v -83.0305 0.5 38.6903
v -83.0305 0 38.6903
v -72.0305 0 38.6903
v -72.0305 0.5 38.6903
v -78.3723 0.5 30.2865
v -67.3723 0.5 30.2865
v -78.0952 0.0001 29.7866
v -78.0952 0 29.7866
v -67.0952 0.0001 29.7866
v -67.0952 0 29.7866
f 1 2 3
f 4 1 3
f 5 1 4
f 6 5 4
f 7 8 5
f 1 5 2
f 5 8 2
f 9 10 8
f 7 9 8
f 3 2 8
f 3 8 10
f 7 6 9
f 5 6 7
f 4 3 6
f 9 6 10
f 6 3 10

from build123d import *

# Parameters (mm, degrees)
BOSS_EXTRUDE1_DEPTH = 0.5
CHAMFER1_SIZE       = 0.5


with BuildPart() as part:
    # Sketch1 → Boss-Extrude1 (new body)
    with BuildSketch(Plane(origin=(0, 0, 0), x_dir=(1, 0, 0), z_dir=(0, 1, 0))):
        Polygon((-78.095165617, -29.786632), (-83.030527551, -38.690260619), (-72.030527551, -38.690260619), (-67.095165617, -29.786632), align=None)
    extrude(amount=BOSS_EXTRUDE1_DEPTH)

    # Chamfer1
    chamfer1_edges = [part.edges().sort_by_distance(p)[0] for p in [
        (-72.595165617, 0.5, 29.786632),
    ]]
    chamfer(chamfer1_edges, length=CHAMFER1_SIZE - 0.0001)  # a hair under: the kernel refuses the full size


solid = part.part
